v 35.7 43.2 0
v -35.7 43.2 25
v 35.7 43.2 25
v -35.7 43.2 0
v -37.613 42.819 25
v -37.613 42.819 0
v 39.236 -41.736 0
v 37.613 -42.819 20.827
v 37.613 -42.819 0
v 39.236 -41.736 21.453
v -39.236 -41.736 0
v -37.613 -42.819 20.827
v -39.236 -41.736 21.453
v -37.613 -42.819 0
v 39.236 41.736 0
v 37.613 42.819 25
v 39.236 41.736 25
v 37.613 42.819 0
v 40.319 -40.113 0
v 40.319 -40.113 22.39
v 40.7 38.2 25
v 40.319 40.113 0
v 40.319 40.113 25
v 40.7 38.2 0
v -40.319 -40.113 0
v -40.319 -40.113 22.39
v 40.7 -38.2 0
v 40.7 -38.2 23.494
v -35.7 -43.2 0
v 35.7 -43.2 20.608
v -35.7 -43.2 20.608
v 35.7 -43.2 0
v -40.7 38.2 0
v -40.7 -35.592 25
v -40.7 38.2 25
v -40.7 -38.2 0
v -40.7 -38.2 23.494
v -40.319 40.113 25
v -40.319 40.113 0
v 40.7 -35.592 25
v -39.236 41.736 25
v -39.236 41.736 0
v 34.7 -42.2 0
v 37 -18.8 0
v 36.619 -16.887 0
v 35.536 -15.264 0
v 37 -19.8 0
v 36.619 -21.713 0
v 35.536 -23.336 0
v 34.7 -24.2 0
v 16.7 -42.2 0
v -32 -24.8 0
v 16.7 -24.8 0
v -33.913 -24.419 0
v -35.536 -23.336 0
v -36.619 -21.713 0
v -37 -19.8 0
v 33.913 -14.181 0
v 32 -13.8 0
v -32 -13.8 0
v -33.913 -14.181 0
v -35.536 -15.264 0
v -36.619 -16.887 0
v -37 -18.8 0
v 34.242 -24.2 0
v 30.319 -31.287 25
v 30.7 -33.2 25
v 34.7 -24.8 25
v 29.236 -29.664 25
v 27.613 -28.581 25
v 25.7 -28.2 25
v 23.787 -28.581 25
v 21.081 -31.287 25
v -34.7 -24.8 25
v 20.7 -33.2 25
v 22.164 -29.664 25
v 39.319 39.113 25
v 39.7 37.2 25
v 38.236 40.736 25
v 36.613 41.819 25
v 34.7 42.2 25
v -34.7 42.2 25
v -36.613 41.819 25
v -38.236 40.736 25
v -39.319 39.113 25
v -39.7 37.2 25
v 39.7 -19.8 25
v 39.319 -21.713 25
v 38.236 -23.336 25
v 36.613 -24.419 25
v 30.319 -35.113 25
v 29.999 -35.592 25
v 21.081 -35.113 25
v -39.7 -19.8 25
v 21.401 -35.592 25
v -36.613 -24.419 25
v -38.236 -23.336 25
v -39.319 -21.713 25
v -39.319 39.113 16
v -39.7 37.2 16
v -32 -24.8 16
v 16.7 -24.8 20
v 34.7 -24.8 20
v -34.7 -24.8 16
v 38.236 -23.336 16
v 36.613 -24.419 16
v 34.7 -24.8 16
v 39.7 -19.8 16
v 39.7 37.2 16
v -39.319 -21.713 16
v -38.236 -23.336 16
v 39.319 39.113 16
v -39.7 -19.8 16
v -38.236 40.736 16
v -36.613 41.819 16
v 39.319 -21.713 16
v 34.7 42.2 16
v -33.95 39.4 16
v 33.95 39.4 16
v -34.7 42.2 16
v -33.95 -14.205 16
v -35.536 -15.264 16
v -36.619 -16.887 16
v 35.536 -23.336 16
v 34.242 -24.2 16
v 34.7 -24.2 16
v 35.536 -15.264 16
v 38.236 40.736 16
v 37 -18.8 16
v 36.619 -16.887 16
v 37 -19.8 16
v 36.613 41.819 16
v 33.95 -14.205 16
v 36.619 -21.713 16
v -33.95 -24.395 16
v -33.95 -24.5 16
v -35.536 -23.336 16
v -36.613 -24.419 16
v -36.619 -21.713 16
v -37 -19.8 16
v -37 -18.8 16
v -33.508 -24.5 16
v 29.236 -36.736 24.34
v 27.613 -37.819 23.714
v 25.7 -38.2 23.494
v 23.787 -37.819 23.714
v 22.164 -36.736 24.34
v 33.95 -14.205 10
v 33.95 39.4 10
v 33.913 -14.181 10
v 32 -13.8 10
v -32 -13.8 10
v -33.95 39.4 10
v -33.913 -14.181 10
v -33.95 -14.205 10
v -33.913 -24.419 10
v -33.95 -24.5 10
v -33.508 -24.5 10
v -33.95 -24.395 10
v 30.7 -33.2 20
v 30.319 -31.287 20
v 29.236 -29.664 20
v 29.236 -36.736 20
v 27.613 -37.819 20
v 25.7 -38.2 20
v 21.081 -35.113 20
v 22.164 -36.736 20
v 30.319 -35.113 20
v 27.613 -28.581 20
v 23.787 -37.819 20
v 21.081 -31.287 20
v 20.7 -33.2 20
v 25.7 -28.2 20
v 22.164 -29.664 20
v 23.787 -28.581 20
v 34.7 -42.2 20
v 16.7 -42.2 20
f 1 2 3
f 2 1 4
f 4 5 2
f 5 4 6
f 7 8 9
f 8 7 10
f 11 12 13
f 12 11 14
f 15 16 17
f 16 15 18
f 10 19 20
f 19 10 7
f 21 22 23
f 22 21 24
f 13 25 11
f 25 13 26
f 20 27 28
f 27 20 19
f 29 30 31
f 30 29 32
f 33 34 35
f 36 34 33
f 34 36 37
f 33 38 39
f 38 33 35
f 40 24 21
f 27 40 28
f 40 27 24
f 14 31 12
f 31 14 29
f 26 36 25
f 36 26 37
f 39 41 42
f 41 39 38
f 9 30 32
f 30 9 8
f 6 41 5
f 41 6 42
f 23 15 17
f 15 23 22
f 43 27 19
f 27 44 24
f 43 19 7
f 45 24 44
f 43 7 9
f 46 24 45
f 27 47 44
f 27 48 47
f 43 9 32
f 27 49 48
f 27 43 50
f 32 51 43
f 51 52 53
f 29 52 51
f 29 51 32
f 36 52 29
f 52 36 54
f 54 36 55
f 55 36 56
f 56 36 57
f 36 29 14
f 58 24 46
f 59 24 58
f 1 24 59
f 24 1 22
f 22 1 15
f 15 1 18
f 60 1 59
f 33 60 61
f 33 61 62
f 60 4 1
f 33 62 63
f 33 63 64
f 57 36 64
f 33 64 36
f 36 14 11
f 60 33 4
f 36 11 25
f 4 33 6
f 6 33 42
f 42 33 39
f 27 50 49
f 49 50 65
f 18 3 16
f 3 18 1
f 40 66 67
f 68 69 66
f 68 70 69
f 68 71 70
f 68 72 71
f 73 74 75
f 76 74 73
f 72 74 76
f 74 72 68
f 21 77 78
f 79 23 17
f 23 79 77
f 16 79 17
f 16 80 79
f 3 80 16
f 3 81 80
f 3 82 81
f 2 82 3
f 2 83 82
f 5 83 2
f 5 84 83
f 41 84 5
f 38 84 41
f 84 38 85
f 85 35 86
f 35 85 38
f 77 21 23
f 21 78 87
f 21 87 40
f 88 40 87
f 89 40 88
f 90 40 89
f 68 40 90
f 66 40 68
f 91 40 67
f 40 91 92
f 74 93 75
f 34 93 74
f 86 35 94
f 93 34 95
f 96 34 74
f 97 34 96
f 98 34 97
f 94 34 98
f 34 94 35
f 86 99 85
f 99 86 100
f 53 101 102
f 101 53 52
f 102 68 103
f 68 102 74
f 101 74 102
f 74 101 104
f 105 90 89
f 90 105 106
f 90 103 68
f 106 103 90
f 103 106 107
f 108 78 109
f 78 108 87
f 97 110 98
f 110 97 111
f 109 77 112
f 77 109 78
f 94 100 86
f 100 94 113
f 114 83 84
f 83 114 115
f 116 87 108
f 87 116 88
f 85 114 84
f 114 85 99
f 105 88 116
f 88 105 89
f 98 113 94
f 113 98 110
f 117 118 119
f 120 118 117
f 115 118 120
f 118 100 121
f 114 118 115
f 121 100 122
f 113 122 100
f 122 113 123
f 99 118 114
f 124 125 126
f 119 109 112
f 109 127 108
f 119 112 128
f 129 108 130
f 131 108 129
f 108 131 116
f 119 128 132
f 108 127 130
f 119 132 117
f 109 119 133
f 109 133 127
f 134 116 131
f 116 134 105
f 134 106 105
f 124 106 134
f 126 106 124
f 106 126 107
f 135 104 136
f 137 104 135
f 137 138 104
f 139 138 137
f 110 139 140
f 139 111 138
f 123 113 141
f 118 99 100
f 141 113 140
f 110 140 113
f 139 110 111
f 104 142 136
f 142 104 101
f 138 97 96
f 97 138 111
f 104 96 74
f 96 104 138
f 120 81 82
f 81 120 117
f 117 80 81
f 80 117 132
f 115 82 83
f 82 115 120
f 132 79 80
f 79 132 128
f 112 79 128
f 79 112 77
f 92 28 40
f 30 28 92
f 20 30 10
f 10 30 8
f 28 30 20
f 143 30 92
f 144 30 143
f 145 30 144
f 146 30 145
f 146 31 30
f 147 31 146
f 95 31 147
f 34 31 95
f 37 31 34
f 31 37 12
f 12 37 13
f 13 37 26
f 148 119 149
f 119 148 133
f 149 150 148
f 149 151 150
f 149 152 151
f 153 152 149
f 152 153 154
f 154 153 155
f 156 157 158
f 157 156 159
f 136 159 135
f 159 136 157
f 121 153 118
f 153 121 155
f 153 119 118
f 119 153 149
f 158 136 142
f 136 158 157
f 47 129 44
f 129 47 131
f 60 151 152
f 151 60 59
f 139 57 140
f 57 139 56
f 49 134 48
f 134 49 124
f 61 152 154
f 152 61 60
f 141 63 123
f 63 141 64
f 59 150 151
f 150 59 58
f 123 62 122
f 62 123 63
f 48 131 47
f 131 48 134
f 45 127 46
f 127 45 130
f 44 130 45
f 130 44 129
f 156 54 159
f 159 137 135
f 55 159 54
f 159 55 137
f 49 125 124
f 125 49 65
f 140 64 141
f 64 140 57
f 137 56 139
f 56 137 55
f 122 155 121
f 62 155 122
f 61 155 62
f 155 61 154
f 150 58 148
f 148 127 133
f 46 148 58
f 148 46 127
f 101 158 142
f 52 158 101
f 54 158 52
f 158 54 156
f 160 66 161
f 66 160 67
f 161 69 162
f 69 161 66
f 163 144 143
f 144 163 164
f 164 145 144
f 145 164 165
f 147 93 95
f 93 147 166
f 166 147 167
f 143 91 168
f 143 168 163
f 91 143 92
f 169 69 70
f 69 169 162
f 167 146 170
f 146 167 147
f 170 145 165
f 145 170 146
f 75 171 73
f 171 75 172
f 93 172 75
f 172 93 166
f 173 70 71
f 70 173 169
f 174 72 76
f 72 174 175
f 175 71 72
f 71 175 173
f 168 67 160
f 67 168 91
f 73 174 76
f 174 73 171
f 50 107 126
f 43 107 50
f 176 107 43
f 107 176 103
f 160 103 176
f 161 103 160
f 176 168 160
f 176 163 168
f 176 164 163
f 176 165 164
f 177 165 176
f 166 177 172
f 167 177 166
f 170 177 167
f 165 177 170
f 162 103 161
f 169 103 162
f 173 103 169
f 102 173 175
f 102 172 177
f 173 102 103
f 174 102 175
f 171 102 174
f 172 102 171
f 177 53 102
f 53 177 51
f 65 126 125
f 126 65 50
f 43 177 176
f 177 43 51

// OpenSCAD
width=86.4-5;
height=91.4-5;
lcd_width=67.9;
lcd_height=63.9;
disp_wall_thickness = 1.0;
glass_width=width-2*disp_wall_thickness;
glass_height=67;




difference() {
    
    
    translate([-width/2+5,-height/2+5,0]) {

        minkowski(){
            cube([width-10,height-10,15],center=false);
            rotate([0,0,90]) cylinder(h=10,r=5);
        }
    }

    translate([-glass_width/2+5,-(glass_height - height/2)+5-disp_wall_thickness,16])
        minkowski(){
            cube([glass_width-10,glass_height-10,4.001],center=false);
            rotate([0,0,90]) cylinder(h=5,r=5);
        }
    
    translate([0,-height/2-12,31])
        rotate([30,0,0])
            cube([120,30,30],center=true);
        
    translate([-lcd_width/2,-(height-lcd_height)-2,10])
        cube([lcd_width,lcd_height,40],center=false);
        
    translate([-32,-(glass_height - height/2)+5-disp_wall_thickness,-1])
        minkowski(){
            cube([64,1,4.001],center=false);
            rotate([0,0,90]) cylinder(h=40,r=5);
        }
    translate([width/2-15, -height/2+10,10])
        cylinder(h=40,d=10,center=true);
    
    translate([width/2-15, -height/2+10,10])
        cube([18,18,20.001],center=true);    
}
